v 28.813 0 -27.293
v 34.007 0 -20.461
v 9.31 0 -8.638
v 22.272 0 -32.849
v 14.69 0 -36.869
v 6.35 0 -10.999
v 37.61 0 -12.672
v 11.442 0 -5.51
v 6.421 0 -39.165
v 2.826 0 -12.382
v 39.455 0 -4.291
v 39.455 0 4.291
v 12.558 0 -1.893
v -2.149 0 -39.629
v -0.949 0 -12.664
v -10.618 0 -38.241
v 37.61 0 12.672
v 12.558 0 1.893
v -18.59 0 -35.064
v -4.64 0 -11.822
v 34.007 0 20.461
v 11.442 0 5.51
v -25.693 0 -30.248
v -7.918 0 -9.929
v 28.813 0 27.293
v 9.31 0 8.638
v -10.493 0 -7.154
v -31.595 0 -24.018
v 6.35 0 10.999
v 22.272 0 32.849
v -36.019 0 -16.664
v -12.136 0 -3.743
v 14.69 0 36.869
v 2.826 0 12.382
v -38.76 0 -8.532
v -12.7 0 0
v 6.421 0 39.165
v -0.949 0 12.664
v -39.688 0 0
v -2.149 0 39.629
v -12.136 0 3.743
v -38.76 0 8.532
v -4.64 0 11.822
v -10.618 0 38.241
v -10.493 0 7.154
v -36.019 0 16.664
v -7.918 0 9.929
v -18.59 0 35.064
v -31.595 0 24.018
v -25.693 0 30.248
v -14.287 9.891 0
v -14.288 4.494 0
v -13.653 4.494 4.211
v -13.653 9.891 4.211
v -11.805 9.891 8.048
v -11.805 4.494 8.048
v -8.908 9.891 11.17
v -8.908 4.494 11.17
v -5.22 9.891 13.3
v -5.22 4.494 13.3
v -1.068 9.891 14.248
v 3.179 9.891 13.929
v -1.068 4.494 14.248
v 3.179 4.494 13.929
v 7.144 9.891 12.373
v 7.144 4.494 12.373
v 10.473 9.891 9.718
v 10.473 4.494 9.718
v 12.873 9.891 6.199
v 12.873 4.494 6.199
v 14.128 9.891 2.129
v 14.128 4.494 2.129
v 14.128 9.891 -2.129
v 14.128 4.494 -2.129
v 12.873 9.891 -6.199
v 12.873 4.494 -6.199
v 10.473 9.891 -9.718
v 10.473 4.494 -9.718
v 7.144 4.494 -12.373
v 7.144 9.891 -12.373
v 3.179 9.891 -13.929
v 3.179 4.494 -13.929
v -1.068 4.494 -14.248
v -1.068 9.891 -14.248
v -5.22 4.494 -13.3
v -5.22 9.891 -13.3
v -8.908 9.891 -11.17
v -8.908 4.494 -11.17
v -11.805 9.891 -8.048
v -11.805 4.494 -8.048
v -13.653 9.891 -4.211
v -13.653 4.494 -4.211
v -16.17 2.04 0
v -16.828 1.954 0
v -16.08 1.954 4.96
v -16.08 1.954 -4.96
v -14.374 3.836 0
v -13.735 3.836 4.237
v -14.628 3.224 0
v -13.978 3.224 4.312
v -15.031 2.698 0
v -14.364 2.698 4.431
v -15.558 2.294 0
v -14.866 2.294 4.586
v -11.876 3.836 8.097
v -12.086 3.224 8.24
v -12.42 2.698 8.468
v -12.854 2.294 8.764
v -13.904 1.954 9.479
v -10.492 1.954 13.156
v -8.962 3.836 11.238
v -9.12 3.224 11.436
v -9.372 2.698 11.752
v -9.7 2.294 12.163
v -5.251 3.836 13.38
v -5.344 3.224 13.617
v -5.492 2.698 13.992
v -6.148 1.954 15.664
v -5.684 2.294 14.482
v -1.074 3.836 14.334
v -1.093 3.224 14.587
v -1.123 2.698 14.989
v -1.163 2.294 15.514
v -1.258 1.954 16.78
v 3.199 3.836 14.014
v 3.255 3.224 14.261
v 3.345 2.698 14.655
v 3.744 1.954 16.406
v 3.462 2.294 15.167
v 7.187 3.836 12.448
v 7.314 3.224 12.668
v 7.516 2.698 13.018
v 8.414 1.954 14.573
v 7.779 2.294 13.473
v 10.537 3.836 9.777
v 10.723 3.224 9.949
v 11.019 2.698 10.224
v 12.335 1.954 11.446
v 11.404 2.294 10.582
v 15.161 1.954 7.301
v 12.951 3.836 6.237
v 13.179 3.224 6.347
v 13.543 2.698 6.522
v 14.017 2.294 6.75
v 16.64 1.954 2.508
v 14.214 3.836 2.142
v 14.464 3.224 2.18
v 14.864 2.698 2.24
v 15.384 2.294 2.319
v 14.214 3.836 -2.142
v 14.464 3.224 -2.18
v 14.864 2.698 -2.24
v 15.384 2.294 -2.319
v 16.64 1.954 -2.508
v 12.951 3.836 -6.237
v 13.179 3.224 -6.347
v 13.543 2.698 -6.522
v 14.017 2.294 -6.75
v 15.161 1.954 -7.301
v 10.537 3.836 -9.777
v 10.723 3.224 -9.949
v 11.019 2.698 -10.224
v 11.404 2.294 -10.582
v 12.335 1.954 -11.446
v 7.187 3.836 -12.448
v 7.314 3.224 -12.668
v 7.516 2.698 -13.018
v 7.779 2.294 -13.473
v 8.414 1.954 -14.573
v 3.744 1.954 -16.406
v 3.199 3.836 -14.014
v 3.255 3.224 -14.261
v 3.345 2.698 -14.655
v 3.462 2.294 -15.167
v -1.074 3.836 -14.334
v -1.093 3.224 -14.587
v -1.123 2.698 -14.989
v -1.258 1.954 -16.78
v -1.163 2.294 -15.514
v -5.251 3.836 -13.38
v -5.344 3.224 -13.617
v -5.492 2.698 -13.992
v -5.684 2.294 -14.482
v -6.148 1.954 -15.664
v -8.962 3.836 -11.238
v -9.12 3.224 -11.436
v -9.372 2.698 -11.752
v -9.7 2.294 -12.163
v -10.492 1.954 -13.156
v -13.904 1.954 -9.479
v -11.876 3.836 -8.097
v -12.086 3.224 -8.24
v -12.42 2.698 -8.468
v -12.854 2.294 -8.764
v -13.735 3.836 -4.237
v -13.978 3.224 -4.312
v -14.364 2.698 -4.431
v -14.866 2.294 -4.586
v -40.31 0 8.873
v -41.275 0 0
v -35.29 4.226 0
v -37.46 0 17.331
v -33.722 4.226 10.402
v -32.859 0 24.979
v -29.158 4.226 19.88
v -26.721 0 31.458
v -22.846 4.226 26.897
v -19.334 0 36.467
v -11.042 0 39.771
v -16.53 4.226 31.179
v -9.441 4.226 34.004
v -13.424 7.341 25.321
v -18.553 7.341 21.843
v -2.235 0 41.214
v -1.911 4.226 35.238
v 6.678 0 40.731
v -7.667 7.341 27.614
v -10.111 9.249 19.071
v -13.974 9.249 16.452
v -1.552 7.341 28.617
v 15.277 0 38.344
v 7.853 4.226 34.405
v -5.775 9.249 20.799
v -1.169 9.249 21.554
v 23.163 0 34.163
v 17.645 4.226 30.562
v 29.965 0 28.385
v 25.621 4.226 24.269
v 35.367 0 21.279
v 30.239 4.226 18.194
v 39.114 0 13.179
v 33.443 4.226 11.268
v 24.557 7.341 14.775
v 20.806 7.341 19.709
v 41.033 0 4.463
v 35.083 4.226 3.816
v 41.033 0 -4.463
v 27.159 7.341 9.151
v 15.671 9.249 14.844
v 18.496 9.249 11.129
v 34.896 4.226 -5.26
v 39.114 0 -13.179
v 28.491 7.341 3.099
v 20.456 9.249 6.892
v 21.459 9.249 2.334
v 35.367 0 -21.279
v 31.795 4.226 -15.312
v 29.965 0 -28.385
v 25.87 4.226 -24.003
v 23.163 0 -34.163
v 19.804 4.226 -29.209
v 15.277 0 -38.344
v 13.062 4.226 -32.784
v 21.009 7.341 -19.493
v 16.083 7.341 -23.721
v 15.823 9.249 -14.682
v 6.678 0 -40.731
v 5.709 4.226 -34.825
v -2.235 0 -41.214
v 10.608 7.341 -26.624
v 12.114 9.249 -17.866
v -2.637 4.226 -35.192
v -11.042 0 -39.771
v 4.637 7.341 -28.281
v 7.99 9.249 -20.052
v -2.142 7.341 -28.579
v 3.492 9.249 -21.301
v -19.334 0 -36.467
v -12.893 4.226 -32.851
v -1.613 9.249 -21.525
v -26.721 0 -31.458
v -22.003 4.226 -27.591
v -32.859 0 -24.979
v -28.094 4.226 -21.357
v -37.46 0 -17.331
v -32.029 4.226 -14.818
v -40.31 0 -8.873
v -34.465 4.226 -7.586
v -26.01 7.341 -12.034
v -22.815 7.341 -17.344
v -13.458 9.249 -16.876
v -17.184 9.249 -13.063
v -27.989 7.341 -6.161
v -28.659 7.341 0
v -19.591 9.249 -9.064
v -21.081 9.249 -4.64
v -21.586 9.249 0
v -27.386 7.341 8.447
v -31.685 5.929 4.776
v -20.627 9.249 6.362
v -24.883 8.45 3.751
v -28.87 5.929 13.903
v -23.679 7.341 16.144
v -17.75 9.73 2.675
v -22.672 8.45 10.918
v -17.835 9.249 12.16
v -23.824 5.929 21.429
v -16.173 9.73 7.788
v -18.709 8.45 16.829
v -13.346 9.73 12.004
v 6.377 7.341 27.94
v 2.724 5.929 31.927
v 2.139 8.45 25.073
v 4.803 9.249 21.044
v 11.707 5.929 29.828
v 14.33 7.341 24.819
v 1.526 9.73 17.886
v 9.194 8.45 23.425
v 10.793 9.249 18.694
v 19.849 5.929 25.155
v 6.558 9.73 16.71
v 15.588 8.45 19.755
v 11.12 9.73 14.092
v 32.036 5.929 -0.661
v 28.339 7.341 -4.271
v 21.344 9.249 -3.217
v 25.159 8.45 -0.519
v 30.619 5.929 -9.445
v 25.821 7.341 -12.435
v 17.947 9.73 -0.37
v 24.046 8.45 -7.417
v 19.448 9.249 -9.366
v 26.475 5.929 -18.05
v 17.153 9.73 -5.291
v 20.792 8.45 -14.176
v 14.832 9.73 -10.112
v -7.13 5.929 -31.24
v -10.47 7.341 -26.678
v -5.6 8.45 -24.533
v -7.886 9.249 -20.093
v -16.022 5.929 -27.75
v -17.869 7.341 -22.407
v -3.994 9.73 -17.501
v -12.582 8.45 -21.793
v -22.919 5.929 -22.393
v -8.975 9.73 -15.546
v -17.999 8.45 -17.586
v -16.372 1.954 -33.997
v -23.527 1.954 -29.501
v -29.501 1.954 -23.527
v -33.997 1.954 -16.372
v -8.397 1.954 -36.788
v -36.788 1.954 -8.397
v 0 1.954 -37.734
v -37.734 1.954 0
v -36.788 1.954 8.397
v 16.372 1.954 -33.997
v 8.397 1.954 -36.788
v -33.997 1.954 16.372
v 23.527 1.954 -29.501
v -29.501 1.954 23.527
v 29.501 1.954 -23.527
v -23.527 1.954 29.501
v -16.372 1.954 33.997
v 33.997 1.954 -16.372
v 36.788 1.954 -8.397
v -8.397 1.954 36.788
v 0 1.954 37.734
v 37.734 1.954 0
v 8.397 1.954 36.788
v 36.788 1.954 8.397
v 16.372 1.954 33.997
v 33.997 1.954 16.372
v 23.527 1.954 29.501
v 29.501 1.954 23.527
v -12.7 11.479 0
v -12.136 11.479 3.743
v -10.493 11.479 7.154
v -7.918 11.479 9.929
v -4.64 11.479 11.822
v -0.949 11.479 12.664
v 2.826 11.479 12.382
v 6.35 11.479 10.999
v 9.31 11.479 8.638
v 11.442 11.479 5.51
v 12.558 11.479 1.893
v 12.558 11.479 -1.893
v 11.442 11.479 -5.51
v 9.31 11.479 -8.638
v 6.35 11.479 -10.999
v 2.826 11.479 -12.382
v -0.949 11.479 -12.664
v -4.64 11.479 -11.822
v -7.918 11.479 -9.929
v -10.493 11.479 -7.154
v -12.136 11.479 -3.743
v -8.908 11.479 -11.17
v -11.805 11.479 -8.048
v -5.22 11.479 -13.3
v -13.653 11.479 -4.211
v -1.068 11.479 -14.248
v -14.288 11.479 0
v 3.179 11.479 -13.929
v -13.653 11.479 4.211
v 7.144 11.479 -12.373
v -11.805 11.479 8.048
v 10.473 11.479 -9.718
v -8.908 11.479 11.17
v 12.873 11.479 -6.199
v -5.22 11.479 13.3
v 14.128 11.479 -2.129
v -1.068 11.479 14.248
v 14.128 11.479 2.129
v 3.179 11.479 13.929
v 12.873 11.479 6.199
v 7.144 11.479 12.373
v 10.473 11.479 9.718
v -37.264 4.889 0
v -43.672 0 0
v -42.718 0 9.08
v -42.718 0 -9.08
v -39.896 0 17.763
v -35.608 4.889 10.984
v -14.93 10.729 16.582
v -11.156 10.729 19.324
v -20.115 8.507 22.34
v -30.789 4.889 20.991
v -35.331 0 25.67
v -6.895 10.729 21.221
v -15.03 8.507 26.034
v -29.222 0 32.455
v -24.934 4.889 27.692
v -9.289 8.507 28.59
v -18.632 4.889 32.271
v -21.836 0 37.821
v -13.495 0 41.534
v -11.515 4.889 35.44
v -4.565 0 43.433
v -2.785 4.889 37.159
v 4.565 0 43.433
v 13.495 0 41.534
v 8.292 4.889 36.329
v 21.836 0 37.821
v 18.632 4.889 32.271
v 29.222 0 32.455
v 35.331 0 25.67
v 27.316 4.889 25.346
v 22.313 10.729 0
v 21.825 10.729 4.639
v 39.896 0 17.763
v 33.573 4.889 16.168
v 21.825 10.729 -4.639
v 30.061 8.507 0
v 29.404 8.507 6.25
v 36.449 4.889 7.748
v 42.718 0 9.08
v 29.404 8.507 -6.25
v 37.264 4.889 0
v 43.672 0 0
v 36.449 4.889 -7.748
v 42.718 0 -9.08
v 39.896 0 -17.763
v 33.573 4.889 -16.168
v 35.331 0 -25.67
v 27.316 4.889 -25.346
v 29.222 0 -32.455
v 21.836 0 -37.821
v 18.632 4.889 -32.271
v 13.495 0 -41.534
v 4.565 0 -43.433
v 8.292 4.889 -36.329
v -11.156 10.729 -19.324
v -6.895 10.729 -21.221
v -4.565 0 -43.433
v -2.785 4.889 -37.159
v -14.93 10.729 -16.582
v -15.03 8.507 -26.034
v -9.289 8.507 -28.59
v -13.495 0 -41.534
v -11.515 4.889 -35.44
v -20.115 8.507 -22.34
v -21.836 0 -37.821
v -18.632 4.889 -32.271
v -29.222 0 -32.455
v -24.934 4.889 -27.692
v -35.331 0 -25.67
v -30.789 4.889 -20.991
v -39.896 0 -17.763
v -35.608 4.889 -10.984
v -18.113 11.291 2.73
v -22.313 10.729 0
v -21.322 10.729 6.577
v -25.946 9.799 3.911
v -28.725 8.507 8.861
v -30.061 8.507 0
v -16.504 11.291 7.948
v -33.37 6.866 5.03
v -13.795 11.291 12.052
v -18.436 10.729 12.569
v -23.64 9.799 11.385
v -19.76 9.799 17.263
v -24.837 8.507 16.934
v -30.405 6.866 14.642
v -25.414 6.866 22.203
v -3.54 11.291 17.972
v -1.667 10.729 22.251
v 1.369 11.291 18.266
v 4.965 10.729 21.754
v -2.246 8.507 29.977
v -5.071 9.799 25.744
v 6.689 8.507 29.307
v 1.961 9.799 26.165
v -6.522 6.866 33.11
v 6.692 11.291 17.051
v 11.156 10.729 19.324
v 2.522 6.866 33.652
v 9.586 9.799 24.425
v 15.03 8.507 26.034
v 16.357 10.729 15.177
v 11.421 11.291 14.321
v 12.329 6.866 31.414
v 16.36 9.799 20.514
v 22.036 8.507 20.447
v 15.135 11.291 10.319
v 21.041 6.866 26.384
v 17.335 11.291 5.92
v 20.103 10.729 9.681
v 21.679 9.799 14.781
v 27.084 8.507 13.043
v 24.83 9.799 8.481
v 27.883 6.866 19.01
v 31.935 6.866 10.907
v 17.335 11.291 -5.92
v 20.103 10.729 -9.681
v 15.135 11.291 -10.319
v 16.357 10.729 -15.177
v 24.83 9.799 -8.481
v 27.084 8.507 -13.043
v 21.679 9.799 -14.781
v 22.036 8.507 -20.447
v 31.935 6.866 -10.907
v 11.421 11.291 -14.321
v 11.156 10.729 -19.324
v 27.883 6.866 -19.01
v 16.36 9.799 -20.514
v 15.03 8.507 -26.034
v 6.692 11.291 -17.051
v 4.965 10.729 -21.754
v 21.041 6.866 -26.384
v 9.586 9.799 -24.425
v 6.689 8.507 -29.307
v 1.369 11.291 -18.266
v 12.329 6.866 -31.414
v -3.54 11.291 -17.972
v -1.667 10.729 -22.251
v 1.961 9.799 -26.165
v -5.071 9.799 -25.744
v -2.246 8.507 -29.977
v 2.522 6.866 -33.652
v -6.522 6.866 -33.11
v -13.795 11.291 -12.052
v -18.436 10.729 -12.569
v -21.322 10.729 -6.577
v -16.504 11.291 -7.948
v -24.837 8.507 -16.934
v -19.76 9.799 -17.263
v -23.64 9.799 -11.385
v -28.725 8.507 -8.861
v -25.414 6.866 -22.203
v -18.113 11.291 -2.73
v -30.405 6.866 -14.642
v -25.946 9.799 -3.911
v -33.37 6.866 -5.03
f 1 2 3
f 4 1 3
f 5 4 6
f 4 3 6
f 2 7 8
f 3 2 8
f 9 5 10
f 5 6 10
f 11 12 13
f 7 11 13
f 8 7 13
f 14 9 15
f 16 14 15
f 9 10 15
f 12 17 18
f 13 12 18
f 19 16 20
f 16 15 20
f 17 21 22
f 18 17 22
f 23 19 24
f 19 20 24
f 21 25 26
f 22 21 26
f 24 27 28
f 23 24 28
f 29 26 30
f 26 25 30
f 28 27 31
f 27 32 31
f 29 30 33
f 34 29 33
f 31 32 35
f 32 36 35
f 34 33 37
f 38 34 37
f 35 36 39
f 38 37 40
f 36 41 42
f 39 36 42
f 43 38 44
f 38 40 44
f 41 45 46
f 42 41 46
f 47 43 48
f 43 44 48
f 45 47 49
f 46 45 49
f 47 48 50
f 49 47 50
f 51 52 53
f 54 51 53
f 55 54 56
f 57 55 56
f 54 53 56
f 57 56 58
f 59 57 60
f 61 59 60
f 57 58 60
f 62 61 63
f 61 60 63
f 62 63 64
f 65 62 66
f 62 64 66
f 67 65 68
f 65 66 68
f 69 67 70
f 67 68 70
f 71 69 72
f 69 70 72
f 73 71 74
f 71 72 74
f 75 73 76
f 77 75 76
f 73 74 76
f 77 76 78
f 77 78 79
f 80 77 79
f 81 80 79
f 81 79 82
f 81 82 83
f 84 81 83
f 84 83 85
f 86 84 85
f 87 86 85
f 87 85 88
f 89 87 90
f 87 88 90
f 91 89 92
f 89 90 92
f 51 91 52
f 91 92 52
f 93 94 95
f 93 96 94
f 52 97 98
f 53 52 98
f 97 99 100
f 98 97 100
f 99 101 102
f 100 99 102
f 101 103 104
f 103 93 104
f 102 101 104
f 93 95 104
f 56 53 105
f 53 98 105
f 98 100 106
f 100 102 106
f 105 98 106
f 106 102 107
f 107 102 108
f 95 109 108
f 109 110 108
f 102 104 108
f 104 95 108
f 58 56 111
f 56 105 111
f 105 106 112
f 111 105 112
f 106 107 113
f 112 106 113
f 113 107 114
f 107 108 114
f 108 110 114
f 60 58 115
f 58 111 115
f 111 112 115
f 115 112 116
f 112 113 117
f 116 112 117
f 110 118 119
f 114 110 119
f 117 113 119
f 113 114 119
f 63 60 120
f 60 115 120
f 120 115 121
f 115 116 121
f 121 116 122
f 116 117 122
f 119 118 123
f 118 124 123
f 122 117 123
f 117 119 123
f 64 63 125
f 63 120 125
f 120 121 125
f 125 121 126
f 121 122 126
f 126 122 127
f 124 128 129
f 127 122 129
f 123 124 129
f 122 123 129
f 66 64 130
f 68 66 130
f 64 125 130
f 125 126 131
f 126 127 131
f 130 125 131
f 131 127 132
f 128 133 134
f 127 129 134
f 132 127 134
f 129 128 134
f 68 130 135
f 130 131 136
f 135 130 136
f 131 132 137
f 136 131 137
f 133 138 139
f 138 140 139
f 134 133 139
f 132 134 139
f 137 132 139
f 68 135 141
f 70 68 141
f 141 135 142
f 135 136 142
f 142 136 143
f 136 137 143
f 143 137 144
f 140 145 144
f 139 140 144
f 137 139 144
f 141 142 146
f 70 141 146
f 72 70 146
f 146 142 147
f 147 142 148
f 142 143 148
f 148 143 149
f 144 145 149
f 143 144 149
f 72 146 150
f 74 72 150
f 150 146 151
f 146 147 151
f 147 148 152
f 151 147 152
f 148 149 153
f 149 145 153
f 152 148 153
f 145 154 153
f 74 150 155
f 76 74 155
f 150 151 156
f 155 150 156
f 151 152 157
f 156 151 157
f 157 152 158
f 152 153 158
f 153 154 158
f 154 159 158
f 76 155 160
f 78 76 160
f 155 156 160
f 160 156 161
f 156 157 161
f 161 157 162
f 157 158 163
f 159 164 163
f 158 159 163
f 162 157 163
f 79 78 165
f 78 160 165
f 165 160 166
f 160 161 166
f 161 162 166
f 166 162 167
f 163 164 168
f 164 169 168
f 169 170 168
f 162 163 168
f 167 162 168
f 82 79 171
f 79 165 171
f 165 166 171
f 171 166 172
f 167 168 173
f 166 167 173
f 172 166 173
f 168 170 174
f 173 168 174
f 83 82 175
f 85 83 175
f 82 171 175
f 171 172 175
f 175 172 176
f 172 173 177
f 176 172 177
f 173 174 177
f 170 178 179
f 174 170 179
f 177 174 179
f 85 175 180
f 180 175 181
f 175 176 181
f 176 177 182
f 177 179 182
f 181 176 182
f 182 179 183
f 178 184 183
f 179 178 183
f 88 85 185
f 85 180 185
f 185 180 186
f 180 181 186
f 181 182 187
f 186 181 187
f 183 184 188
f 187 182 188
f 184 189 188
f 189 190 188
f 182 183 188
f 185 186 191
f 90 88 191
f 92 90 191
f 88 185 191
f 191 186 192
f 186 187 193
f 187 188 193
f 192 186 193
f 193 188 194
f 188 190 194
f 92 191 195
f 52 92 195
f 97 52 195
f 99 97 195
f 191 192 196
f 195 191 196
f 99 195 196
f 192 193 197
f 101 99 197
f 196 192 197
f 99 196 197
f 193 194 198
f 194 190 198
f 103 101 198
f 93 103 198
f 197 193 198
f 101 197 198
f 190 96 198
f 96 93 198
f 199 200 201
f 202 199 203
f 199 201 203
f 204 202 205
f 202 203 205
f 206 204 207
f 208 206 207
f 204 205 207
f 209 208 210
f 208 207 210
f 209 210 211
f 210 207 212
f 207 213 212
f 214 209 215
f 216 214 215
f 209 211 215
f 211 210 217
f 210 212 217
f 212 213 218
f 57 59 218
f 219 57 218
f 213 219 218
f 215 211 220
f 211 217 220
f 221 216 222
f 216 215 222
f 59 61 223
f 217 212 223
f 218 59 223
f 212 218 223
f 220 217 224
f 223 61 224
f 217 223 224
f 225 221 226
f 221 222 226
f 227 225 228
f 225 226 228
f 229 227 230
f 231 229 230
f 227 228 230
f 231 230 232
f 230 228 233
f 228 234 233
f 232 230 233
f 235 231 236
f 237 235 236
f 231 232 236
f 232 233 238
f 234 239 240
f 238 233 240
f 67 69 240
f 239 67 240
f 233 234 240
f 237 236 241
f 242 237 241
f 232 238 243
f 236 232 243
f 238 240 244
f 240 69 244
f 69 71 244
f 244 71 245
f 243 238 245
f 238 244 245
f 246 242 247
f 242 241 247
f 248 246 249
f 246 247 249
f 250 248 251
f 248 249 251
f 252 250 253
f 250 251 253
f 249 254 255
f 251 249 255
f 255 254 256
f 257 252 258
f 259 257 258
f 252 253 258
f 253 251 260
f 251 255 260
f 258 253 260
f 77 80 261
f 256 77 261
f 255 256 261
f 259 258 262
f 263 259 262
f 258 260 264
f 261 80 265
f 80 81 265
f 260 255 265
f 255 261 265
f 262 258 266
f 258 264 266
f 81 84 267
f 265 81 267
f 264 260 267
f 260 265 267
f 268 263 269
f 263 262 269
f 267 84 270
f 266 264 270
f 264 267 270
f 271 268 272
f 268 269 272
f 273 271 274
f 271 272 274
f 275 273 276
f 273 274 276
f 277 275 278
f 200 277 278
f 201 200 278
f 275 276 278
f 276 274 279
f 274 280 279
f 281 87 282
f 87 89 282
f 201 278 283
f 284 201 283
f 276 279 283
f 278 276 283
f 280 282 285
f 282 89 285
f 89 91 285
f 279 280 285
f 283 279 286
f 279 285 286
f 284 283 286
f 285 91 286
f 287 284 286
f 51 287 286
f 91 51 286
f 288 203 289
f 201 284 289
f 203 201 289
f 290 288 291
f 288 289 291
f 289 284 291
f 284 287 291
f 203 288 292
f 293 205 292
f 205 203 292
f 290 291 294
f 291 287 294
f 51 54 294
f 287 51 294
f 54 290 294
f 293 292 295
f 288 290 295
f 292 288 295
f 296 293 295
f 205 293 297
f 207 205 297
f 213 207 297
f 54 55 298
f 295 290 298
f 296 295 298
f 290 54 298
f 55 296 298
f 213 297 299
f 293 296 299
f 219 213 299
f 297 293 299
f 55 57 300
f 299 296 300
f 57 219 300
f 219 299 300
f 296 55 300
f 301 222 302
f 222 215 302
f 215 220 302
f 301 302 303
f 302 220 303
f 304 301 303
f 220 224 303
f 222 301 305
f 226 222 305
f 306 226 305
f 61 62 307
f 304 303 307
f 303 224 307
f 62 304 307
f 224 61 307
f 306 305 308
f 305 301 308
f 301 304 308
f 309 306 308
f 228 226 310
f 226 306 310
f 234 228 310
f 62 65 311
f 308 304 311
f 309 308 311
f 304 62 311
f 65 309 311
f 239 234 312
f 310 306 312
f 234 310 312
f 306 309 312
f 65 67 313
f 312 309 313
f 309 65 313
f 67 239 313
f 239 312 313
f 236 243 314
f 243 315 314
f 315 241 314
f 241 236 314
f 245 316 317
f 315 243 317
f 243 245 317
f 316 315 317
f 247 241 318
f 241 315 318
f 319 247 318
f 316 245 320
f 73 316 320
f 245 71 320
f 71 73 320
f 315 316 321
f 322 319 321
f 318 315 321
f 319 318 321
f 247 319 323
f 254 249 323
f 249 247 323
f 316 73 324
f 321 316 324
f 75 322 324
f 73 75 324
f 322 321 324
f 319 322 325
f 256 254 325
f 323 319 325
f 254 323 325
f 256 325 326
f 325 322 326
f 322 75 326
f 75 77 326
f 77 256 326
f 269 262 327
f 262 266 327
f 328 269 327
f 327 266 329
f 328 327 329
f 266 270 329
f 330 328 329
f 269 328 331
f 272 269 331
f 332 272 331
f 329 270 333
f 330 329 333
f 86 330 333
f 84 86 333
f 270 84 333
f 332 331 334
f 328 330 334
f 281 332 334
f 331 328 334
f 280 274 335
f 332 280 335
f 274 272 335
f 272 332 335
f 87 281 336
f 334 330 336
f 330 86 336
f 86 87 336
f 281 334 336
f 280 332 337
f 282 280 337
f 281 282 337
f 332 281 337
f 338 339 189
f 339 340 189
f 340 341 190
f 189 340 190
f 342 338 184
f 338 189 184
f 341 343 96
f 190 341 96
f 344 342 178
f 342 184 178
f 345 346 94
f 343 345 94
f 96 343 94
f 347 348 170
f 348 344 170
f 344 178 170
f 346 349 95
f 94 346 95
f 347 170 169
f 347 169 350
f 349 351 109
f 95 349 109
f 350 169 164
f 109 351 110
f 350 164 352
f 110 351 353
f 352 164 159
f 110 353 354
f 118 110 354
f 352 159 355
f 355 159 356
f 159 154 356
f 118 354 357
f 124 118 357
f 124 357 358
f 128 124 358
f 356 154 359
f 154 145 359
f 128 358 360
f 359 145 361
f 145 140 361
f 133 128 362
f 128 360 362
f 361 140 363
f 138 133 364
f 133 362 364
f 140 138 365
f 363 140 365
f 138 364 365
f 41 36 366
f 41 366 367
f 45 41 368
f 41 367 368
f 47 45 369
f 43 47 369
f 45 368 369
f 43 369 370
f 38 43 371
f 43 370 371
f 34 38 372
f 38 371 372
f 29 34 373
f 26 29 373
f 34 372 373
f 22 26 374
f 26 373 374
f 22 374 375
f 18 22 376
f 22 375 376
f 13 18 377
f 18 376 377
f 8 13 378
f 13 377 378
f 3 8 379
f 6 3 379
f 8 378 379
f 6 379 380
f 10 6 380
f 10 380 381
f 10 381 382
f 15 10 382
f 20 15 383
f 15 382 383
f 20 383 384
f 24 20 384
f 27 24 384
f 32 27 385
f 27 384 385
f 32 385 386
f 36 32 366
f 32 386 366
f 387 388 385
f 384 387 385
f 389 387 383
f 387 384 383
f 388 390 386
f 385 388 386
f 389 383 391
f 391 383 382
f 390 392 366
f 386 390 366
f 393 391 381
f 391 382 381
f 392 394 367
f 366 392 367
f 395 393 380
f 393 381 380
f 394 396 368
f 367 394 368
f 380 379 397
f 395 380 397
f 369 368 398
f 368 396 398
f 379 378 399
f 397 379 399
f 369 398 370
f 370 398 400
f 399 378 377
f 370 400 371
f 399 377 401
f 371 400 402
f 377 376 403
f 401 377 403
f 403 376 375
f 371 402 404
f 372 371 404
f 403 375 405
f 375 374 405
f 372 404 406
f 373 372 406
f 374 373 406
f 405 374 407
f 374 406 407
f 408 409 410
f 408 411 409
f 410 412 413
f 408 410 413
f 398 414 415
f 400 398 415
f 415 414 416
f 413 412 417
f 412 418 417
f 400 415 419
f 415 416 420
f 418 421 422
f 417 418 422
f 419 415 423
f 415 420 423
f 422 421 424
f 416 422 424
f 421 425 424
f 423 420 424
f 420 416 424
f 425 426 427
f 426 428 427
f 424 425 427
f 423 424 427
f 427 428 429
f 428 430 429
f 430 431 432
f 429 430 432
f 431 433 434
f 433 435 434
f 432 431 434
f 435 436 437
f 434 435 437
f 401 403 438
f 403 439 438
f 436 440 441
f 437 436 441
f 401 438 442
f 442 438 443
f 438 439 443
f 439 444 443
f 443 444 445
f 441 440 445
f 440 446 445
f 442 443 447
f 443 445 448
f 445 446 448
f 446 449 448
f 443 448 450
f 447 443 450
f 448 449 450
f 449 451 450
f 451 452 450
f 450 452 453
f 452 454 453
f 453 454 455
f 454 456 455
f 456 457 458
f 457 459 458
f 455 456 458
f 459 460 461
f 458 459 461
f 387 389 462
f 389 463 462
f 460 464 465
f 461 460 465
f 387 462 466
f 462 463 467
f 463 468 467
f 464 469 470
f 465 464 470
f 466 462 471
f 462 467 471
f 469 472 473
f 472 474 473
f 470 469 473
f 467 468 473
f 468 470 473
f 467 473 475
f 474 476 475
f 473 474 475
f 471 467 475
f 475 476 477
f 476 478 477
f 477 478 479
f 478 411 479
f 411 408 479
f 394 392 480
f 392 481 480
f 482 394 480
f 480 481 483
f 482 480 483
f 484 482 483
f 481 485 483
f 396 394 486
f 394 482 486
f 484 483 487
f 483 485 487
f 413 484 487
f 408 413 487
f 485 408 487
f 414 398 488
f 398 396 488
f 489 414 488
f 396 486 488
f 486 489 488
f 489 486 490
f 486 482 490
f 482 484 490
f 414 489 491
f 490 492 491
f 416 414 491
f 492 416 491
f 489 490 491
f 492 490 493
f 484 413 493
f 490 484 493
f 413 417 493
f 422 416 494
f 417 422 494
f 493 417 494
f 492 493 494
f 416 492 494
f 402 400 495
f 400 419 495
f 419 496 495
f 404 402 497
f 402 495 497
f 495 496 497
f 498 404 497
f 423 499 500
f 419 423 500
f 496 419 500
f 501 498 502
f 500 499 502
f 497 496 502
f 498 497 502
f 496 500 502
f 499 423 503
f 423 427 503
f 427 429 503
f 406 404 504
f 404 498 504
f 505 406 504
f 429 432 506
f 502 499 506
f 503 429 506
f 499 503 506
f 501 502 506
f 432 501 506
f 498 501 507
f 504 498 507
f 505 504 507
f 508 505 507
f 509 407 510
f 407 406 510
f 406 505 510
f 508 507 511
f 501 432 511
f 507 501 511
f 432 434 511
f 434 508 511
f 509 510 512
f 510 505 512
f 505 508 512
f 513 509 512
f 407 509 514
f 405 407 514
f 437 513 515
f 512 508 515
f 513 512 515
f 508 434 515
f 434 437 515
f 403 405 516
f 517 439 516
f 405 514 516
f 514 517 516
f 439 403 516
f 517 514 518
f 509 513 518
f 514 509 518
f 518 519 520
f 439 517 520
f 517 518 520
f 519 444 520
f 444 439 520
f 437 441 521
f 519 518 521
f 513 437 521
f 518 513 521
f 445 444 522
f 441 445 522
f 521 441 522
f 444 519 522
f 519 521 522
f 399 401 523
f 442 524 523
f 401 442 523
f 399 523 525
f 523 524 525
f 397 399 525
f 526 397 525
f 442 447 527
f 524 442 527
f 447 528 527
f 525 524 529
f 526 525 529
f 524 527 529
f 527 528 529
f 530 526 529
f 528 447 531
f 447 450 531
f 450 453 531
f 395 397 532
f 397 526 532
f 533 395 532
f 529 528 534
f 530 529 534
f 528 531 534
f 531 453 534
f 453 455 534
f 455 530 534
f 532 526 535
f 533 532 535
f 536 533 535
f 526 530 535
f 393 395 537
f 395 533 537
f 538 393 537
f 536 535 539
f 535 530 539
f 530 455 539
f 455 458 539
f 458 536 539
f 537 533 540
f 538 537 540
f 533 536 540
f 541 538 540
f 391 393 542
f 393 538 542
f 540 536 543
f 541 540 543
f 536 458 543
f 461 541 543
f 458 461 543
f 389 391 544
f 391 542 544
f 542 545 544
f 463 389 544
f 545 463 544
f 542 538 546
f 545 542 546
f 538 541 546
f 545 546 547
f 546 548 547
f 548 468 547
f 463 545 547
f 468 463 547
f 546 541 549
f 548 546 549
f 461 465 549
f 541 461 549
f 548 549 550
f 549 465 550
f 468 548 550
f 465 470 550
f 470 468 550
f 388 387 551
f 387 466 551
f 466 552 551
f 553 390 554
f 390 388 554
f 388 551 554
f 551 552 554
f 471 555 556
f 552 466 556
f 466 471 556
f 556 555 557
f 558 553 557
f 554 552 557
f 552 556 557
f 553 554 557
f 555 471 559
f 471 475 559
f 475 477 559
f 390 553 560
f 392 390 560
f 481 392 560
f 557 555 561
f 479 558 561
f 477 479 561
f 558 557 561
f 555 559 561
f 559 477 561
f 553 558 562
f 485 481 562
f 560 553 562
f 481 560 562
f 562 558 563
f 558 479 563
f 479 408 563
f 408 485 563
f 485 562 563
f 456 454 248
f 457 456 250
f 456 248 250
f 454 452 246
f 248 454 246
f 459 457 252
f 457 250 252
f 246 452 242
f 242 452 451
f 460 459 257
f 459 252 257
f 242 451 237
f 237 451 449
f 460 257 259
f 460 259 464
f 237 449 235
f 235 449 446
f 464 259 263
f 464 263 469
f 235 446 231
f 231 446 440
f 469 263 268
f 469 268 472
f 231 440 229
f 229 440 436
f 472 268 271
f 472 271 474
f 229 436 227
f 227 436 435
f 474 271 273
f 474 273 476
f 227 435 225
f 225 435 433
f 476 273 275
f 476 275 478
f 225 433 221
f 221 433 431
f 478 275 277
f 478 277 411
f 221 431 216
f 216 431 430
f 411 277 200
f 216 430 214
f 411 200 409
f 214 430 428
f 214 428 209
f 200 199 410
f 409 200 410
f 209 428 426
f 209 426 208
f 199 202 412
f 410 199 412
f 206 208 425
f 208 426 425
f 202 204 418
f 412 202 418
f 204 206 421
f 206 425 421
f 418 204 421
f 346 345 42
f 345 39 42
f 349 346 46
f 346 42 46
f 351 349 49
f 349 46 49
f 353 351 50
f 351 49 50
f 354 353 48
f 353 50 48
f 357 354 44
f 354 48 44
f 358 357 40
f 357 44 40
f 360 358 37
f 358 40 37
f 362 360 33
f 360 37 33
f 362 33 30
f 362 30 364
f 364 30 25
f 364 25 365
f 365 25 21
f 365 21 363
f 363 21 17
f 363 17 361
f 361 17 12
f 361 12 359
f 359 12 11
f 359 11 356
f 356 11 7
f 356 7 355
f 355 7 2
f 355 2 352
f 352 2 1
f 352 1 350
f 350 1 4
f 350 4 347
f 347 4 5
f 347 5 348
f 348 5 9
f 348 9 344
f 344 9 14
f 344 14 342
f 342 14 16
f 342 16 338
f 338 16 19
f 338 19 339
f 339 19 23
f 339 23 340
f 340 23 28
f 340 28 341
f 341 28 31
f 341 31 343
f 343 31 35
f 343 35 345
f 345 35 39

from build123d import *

# Parameters (mm, degrees)
FILLET1_R = 2.54


with BuildPart() as part:
    # Sketch1 → Revolve1 (revolve)
    with BuildSketch(Plane.XY):
        with BuildLine():
            Line((-12.7, 0), (-12.7, 11.478846154))
            Line((-12.7, 11.478846154), (-14.2875, 11.478846154))
            ThreePointArc((-14.2875, 11.478846154), (-30.060922467, 8.507285925), (-43.671841345, 0))
            Line((-43.671841345, 0), (-41.275, 0))
            ThreePointArc((-41.275, 0), (-28.659033364, 7.340612874), (-14.2875, 9.891346154))
            Line((-14.2875, 9.891346154), (-14.2875, 1.953846154))
            Line((-14.2875, 1.953846154), (-37.733653846, 1.953846154))
            Line((-37.733653846, 1.953846154), (-39.6875, 0))
            Line((-39.6875, 0), (-12.7, 0))
        make_face()
    revolve(axis=Axis((0, 0, 0), (0, 1, 0)))

    # Fillet1
    fillet1_edges = [part.edges().sort_by_distance(p)[0] for p in [
        (14.2875, 1.953846154, 0),
    ]]
    fillet(fillet1_edges, radius=FILLET1_R)


solid = part.part
